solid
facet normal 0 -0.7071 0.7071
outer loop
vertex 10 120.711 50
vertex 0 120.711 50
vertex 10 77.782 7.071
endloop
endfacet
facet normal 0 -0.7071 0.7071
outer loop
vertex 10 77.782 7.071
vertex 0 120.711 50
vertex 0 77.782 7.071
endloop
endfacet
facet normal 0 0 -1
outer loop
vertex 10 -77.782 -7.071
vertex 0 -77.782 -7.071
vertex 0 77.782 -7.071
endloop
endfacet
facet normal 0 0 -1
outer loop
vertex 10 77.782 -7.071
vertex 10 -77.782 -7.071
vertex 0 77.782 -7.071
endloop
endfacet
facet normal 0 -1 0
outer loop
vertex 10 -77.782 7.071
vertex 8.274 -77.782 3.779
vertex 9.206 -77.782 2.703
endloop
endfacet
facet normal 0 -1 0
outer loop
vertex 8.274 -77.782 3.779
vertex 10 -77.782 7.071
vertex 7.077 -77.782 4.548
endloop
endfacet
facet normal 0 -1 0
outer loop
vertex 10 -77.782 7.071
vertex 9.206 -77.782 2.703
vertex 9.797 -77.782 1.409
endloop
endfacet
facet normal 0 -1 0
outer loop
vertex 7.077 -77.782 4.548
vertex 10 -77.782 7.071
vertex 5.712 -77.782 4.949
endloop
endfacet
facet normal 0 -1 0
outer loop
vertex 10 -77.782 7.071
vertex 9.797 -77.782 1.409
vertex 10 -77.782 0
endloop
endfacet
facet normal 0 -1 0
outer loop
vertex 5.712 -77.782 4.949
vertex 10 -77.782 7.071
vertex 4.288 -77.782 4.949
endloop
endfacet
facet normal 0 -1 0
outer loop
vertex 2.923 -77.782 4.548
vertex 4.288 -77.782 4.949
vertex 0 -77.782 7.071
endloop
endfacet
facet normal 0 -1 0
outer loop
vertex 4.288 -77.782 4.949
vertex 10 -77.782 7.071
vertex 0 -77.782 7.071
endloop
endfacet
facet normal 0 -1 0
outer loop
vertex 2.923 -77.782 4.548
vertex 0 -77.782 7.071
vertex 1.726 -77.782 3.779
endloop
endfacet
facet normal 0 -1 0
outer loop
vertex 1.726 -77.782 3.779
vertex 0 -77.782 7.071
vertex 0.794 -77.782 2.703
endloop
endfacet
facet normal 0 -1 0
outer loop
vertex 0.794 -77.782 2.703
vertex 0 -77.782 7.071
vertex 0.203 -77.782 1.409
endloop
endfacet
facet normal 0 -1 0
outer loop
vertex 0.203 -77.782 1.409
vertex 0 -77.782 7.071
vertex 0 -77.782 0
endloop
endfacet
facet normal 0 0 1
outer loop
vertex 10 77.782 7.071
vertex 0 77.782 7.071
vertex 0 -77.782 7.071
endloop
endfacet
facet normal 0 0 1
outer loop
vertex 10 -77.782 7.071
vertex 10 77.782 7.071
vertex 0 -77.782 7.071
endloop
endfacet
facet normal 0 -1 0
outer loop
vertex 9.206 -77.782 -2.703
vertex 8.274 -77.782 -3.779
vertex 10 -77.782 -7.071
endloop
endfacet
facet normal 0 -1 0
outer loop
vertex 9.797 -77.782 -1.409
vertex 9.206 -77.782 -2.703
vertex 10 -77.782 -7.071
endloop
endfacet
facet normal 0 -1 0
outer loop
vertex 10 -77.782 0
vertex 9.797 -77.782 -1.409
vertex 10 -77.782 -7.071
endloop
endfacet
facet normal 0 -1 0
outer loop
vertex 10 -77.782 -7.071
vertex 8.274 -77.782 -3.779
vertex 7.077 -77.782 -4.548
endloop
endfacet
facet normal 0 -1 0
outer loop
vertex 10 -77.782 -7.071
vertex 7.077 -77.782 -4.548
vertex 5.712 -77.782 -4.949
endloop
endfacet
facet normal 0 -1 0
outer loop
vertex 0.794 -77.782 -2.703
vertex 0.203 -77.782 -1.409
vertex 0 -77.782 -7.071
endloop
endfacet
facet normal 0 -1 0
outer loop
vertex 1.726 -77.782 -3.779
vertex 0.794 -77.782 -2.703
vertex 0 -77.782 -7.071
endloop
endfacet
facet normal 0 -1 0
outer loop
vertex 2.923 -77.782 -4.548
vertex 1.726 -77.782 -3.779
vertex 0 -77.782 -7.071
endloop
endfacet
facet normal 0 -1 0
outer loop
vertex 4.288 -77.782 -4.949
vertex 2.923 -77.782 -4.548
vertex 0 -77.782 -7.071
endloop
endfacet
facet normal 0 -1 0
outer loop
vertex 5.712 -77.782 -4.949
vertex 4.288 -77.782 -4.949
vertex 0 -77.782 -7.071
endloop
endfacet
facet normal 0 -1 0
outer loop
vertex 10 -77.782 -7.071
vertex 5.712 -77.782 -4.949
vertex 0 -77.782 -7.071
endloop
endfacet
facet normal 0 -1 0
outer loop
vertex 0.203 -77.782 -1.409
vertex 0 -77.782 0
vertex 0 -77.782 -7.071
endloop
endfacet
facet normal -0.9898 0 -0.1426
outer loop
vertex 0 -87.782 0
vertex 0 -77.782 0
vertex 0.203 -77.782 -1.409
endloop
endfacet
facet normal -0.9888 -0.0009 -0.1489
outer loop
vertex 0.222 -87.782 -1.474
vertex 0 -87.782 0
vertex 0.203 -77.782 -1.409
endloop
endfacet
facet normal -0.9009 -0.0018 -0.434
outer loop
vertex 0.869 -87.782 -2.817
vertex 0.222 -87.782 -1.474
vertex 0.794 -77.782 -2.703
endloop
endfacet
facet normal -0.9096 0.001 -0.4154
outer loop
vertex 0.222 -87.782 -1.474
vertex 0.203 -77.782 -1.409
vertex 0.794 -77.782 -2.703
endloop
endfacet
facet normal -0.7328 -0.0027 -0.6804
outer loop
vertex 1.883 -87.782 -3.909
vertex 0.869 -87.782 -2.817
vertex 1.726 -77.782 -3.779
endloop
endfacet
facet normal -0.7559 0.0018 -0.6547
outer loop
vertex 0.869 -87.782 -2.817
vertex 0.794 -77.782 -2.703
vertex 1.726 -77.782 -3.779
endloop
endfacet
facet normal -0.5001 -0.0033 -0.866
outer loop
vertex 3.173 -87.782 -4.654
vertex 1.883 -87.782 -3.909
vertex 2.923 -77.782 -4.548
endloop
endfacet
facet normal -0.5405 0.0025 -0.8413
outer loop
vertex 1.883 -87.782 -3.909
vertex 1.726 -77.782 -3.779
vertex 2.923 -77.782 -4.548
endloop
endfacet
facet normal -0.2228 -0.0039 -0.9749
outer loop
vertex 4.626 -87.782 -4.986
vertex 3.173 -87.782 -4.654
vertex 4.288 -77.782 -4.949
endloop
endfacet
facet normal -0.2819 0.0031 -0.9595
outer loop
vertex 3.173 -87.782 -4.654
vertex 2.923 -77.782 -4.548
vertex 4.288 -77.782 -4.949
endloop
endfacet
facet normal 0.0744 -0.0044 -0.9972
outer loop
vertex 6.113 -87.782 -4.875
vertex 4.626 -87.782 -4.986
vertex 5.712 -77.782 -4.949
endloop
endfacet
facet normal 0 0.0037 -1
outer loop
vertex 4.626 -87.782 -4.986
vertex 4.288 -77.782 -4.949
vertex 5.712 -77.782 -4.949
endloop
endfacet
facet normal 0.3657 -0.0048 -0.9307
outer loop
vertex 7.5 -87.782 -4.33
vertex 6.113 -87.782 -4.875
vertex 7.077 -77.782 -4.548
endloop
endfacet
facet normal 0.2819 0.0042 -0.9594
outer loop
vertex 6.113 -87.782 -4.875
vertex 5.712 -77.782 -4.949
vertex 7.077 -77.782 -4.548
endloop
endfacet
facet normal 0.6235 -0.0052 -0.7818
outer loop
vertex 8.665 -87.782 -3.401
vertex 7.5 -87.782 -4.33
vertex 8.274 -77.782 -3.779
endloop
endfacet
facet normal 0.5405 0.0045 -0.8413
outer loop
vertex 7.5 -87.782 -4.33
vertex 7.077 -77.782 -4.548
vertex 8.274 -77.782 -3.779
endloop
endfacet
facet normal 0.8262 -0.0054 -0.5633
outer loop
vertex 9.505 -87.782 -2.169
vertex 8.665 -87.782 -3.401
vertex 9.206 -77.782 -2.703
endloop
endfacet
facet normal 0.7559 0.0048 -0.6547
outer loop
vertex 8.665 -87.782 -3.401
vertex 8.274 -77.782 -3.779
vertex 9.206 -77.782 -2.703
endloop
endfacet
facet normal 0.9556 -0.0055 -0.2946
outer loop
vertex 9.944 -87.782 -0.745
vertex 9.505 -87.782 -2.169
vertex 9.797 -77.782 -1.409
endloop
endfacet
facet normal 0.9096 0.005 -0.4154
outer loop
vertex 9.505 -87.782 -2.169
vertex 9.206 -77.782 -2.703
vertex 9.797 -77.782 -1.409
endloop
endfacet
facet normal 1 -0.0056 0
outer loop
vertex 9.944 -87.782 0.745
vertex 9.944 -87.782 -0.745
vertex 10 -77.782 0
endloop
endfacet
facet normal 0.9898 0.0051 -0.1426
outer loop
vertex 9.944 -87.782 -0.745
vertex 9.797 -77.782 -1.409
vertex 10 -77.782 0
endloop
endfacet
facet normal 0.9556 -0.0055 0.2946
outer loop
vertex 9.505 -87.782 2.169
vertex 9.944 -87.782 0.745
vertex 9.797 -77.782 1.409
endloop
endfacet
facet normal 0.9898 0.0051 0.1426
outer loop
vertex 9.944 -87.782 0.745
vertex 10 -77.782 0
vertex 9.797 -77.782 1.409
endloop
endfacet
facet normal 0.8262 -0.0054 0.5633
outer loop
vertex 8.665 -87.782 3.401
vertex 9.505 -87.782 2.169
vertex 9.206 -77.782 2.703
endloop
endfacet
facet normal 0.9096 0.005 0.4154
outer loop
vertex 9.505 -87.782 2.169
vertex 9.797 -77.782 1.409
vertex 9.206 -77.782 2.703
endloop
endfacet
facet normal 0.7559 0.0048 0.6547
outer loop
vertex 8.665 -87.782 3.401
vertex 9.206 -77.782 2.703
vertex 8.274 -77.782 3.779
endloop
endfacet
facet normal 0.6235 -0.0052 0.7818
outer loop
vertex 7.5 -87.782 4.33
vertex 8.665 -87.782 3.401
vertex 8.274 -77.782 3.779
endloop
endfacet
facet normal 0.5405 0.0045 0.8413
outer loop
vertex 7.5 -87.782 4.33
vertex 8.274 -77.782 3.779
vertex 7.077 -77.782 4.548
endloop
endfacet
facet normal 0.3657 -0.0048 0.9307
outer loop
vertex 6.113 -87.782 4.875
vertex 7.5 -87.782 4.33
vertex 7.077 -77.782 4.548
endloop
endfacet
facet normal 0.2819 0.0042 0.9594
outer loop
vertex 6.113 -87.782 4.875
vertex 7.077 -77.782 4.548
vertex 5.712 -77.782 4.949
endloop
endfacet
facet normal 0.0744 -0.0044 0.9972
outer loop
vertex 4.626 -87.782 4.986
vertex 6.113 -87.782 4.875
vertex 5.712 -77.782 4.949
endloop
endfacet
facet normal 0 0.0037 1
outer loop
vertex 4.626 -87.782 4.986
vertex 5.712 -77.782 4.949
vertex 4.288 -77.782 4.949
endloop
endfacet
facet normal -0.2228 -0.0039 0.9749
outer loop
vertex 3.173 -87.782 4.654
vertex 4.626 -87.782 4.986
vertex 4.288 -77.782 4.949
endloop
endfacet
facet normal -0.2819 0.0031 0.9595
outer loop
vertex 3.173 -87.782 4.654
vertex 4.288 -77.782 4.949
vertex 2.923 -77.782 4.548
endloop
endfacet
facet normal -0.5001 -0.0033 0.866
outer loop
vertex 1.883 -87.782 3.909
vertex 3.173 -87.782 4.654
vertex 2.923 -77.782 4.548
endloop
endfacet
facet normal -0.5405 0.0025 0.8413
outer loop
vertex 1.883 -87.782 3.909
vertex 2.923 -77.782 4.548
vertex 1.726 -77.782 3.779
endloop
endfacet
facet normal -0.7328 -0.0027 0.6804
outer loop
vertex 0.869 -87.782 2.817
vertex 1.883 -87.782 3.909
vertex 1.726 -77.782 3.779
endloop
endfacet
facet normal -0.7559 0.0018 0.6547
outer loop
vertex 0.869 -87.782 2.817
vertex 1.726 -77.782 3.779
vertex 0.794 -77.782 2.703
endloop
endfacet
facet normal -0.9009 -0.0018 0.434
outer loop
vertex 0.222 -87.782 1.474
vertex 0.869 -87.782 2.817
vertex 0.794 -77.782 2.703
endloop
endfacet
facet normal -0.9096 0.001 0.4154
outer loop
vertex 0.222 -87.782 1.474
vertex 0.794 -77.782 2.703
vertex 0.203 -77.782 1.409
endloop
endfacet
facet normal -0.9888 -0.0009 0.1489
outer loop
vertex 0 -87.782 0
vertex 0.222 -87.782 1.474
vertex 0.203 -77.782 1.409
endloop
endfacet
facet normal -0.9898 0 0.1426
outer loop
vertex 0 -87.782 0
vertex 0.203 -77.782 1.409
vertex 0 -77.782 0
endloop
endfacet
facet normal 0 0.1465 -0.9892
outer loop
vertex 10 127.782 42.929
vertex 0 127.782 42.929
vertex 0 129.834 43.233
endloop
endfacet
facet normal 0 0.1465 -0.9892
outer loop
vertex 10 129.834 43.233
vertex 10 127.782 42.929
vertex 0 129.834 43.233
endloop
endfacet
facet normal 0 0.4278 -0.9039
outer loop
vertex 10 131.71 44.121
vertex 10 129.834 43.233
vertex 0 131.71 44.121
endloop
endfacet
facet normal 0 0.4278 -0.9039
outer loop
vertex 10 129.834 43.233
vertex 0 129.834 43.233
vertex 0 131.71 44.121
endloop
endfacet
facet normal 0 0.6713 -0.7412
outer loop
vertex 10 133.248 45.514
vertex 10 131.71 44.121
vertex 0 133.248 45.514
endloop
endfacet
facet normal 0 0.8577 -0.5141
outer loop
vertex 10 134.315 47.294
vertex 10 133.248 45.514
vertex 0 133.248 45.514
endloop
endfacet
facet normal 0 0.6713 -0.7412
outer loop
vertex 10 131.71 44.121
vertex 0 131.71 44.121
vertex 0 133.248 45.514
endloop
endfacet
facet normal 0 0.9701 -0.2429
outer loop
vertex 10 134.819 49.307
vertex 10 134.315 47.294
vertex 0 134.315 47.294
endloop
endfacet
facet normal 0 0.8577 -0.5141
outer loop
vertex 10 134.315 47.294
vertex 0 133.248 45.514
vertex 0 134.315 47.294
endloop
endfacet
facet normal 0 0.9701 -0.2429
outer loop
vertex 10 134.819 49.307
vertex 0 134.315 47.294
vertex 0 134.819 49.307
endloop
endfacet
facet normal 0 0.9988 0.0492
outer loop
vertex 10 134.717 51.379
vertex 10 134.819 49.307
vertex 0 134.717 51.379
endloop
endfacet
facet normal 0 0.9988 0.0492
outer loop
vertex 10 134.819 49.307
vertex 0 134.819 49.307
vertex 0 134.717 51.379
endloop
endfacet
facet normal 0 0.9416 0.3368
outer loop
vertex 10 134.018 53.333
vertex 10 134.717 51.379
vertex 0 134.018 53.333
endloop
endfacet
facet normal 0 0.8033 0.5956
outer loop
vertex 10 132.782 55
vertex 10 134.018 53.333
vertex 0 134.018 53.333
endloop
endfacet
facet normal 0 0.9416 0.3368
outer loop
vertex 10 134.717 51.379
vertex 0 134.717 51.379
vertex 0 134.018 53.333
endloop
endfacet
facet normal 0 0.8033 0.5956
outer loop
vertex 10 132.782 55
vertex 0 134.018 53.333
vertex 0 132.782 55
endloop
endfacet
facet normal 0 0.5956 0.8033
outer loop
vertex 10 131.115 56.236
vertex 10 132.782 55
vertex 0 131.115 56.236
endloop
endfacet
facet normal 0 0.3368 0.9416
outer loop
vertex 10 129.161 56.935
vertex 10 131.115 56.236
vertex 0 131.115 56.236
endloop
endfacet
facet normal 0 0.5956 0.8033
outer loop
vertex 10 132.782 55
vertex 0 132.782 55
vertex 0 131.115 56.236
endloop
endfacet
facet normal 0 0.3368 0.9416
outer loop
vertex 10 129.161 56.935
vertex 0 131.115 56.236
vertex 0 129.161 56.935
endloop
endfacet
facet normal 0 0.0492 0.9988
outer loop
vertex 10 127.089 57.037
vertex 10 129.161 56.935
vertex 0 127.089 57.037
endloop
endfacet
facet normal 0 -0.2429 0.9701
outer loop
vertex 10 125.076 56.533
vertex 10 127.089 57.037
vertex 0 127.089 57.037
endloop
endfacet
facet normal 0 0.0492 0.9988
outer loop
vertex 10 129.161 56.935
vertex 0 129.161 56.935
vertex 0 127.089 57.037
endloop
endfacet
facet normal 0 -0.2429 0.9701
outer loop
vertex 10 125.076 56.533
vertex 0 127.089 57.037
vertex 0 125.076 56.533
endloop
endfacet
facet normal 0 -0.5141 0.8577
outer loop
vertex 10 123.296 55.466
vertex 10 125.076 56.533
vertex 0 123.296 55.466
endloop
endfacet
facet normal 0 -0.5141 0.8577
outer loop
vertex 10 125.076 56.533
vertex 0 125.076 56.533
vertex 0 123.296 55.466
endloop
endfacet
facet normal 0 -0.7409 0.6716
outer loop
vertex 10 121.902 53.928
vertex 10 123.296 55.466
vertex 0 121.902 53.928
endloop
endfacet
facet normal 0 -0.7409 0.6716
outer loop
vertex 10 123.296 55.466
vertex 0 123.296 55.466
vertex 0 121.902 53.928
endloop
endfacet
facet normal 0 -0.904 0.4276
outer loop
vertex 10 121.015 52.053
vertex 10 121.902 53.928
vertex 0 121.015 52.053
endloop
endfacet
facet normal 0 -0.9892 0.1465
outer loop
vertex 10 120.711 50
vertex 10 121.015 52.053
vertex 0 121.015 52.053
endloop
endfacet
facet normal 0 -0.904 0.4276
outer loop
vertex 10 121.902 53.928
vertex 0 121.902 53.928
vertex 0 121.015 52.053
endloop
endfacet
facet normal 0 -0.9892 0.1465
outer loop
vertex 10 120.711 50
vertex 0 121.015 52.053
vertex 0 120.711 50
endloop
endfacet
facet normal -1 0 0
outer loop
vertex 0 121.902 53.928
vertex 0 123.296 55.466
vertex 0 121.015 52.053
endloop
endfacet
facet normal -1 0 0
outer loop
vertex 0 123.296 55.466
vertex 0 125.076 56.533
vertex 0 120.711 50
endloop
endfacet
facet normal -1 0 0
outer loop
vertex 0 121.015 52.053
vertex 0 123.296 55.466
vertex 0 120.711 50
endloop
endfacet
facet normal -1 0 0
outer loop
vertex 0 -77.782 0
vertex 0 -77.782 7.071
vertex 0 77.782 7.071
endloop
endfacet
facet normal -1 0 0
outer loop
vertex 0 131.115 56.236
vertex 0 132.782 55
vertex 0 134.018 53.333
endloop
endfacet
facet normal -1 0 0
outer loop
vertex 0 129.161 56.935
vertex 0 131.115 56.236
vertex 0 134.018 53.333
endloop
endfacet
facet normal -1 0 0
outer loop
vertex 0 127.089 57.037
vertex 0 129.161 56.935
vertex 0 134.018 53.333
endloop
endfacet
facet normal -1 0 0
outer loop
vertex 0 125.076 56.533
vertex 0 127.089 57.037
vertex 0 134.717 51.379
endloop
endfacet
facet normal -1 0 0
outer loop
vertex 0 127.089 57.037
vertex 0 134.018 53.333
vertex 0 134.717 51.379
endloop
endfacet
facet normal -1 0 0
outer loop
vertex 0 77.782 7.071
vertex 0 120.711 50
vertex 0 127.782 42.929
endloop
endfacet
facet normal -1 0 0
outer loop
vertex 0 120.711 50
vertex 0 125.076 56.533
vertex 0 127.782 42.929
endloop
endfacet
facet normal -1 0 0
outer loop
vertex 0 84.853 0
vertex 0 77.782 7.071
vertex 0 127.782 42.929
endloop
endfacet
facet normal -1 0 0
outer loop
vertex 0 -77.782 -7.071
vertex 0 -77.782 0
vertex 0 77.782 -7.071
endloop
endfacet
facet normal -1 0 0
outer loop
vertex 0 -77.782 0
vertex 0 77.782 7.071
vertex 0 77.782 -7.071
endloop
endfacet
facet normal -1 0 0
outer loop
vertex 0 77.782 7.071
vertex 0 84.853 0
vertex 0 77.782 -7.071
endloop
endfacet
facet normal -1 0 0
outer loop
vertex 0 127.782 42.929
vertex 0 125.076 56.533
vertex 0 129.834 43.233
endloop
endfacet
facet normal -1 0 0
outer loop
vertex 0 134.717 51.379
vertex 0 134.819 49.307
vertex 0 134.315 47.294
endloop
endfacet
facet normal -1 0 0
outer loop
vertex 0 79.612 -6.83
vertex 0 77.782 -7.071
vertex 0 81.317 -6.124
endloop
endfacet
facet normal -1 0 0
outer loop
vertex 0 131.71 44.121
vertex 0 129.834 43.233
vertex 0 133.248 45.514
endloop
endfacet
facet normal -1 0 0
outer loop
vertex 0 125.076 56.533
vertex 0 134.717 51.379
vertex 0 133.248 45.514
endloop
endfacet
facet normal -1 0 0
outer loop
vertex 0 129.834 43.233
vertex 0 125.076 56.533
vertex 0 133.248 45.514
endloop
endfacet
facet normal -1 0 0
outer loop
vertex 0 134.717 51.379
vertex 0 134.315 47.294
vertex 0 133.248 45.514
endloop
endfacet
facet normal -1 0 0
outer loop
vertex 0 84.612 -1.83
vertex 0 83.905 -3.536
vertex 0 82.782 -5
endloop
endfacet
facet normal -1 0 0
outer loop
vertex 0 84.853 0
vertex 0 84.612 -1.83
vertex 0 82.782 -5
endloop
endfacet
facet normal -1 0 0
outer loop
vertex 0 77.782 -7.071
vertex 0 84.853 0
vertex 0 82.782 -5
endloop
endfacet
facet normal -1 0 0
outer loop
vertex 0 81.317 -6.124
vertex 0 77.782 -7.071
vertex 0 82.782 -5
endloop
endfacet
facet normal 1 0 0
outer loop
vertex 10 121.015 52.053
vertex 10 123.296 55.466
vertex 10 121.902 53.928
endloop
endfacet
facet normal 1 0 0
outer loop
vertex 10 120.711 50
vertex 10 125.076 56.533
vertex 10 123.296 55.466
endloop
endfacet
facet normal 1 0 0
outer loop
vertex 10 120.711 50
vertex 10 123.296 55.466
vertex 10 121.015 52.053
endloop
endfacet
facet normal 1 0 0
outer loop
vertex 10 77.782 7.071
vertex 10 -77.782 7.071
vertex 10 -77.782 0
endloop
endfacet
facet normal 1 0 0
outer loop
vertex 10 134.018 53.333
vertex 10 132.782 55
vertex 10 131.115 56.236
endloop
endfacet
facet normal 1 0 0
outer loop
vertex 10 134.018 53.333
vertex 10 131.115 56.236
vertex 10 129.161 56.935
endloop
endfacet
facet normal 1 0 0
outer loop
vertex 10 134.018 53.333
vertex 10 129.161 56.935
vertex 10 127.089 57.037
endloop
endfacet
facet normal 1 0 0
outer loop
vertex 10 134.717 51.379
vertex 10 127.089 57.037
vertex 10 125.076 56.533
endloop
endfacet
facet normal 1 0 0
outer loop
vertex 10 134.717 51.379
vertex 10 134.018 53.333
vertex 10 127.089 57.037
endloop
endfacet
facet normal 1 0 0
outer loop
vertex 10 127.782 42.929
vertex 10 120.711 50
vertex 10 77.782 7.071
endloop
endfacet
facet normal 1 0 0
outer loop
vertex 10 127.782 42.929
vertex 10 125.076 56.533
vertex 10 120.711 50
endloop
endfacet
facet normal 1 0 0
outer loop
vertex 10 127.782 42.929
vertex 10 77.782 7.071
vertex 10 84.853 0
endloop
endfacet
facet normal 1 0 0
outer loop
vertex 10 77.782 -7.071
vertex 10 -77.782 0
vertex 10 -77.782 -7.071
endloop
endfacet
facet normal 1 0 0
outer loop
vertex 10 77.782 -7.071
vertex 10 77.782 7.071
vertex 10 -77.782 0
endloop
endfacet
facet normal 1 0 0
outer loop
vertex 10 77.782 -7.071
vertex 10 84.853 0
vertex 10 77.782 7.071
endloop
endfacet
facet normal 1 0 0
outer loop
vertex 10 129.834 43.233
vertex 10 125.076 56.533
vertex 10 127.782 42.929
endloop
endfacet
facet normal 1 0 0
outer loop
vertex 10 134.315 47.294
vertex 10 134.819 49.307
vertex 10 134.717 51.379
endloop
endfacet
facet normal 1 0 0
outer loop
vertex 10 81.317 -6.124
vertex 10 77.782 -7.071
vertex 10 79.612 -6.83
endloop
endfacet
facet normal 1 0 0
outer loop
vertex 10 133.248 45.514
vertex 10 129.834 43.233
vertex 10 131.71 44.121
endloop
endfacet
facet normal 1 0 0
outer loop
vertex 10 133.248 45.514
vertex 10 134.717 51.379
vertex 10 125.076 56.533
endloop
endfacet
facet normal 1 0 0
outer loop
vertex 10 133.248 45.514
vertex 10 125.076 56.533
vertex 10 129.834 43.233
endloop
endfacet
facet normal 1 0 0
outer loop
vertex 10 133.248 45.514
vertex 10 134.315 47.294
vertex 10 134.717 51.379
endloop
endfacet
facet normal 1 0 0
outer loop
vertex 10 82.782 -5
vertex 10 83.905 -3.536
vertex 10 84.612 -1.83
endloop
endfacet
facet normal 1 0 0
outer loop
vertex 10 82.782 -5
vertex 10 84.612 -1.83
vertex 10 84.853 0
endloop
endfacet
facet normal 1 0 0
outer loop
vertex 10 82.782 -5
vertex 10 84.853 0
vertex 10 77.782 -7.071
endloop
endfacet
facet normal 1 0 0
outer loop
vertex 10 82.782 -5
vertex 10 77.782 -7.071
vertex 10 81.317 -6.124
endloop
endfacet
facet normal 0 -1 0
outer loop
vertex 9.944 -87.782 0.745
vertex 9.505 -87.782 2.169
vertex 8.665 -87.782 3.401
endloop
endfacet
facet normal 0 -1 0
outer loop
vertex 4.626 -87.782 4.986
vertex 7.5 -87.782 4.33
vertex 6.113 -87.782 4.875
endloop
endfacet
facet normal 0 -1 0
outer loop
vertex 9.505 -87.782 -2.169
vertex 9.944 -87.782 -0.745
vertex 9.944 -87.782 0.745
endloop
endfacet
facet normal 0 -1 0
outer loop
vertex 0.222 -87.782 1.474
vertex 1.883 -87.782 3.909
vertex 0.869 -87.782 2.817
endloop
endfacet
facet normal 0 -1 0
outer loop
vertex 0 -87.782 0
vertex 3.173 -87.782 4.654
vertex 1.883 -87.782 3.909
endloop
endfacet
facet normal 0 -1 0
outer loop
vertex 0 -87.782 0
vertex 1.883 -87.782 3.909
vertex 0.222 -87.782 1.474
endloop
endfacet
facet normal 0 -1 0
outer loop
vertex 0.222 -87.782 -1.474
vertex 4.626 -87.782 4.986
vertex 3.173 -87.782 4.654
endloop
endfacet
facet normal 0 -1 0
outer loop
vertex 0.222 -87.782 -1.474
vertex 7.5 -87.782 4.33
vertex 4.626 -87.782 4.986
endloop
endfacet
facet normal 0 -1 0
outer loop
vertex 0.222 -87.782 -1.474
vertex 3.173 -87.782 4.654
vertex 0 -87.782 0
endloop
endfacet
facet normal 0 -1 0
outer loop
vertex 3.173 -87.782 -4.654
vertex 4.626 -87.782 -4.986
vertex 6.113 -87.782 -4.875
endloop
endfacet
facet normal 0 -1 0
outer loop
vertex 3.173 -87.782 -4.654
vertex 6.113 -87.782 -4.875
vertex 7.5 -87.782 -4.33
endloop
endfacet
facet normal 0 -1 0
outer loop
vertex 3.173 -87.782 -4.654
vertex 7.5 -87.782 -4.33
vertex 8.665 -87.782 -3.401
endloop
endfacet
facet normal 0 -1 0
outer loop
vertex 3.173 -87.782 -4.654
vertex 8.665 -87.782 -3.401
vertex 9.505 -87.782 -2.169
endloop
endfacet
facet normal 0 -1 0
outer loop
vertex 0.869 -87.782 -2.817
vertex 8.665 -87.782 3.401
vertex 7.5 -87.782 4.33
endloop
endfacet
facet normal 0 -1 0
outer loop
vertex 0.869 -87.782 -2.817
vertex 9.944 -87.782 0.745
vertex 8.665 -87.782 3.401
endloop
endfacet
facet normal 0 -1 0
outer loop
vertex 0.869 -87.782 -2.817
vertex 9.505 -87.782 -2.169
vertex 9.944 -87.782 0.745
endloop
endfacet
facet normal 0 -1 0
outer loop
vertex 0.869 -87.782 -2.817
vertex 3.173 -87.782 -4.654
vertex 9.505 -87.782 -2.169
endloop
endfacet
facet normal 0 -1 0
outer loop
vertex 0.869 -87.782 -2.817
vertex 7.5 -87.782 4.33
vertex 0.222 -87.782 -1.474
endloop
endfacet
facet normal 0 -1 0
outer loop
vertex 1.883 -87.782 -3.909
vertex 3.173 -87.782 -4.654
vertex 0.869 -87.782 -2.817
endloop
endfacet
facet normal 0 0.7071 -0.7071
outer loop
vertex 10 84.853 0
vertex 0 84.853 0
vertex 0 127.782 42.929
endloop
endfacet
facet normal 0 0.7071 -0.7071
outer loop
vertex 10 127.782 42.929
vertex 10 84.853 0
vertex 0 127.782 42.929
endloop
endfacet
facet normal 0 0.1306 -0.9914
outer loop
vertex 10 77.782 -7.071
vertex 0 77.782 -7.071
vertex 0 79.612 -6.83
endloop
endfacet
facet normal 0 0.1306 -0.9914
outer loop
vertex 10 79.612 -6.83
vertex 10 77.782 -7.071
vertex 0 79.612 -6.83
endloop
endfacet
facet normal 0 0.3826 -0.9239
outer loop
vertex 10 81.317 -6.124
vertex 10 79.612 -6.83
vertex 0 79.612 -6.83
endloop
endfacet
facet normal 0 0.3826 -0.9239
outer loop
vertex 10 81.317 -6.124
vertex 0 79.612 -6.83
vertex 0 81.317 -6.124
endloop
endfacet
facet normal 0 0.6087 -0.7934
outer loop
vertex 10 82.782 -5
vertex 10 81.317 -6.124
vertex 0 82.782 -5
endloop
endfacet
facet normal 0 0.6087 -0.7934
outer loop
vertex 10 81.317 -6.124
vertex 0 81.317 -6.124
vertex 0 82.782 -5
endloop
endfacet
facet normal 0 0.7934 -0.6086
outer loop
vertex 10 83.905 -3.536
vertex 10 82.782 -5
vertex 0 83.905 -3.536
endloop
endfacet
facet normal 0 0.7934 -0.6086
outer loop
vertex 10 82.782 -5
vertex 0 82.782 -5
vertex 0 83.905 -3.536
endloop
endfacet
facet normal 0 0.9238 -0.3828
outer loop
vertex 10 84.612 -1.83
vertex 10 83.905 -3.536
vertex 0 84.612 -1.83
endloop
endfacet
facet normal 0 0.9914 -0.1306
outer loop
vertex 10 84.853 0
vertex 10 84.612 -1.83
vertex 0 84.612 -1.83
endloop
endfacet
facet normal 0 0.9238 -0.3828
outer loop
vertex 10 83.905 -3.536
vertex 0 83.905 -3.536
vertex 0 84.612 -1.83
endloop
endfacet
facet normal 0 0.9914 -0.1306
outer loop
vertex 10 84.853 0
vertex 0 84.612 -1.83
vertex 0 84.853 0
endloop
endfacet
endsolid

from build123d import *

# Parameters (mm, degrees)
EXTRUDE_2_DEPTH = 10
SKETCH_3_R      = 5
EXTRUDE_3_DEPTH = 10


with BuildPart() as part:
    # 草图1 → 凸台-拉伸2 (new body)
    with BuildSketch(Plane(origin=(0, 0, 0), x_dir=(0, 0, -1), z_dir=(1, 0, 0))):
        with BuildLine():
            Line((-7.071067812, 77.781745931), (-7.071067812, -77.781745931))
            Line((-7.071067812, -77.781745931), (7.071067812, -77.781745931))
            Line((7.071067812, -77.781745931), (7.071067812, 77.781745931))
            ThreePointArc((7.071067812, 77.781745931), (5, 82.781745931), (0, 84.852813742))
            Line((0, 84.852813742), (-42.928932188, 127.781745931))
            ThreePointArc((-42.928932188, 127.781745931), (-55, 132.781745931), (-50, 120.710678119))
            Line((-50, 120.710678119), (-7.071067812, 77.781745931))
        make_face()
    extrude(amount=EXTRUDE_2_DEPTH)

    # 草图3 → 凸台-拉伸3 (add)
    with BuildSketch(Plane.XZ.offset(77.781745931)):
        with Locations(Location((5, 0, 0), (0, 0, 180))):
            Circle(SKETCH_3_R)
    extrude(amount=EXTRUDE_3_DEPTH)


solid = part.part
